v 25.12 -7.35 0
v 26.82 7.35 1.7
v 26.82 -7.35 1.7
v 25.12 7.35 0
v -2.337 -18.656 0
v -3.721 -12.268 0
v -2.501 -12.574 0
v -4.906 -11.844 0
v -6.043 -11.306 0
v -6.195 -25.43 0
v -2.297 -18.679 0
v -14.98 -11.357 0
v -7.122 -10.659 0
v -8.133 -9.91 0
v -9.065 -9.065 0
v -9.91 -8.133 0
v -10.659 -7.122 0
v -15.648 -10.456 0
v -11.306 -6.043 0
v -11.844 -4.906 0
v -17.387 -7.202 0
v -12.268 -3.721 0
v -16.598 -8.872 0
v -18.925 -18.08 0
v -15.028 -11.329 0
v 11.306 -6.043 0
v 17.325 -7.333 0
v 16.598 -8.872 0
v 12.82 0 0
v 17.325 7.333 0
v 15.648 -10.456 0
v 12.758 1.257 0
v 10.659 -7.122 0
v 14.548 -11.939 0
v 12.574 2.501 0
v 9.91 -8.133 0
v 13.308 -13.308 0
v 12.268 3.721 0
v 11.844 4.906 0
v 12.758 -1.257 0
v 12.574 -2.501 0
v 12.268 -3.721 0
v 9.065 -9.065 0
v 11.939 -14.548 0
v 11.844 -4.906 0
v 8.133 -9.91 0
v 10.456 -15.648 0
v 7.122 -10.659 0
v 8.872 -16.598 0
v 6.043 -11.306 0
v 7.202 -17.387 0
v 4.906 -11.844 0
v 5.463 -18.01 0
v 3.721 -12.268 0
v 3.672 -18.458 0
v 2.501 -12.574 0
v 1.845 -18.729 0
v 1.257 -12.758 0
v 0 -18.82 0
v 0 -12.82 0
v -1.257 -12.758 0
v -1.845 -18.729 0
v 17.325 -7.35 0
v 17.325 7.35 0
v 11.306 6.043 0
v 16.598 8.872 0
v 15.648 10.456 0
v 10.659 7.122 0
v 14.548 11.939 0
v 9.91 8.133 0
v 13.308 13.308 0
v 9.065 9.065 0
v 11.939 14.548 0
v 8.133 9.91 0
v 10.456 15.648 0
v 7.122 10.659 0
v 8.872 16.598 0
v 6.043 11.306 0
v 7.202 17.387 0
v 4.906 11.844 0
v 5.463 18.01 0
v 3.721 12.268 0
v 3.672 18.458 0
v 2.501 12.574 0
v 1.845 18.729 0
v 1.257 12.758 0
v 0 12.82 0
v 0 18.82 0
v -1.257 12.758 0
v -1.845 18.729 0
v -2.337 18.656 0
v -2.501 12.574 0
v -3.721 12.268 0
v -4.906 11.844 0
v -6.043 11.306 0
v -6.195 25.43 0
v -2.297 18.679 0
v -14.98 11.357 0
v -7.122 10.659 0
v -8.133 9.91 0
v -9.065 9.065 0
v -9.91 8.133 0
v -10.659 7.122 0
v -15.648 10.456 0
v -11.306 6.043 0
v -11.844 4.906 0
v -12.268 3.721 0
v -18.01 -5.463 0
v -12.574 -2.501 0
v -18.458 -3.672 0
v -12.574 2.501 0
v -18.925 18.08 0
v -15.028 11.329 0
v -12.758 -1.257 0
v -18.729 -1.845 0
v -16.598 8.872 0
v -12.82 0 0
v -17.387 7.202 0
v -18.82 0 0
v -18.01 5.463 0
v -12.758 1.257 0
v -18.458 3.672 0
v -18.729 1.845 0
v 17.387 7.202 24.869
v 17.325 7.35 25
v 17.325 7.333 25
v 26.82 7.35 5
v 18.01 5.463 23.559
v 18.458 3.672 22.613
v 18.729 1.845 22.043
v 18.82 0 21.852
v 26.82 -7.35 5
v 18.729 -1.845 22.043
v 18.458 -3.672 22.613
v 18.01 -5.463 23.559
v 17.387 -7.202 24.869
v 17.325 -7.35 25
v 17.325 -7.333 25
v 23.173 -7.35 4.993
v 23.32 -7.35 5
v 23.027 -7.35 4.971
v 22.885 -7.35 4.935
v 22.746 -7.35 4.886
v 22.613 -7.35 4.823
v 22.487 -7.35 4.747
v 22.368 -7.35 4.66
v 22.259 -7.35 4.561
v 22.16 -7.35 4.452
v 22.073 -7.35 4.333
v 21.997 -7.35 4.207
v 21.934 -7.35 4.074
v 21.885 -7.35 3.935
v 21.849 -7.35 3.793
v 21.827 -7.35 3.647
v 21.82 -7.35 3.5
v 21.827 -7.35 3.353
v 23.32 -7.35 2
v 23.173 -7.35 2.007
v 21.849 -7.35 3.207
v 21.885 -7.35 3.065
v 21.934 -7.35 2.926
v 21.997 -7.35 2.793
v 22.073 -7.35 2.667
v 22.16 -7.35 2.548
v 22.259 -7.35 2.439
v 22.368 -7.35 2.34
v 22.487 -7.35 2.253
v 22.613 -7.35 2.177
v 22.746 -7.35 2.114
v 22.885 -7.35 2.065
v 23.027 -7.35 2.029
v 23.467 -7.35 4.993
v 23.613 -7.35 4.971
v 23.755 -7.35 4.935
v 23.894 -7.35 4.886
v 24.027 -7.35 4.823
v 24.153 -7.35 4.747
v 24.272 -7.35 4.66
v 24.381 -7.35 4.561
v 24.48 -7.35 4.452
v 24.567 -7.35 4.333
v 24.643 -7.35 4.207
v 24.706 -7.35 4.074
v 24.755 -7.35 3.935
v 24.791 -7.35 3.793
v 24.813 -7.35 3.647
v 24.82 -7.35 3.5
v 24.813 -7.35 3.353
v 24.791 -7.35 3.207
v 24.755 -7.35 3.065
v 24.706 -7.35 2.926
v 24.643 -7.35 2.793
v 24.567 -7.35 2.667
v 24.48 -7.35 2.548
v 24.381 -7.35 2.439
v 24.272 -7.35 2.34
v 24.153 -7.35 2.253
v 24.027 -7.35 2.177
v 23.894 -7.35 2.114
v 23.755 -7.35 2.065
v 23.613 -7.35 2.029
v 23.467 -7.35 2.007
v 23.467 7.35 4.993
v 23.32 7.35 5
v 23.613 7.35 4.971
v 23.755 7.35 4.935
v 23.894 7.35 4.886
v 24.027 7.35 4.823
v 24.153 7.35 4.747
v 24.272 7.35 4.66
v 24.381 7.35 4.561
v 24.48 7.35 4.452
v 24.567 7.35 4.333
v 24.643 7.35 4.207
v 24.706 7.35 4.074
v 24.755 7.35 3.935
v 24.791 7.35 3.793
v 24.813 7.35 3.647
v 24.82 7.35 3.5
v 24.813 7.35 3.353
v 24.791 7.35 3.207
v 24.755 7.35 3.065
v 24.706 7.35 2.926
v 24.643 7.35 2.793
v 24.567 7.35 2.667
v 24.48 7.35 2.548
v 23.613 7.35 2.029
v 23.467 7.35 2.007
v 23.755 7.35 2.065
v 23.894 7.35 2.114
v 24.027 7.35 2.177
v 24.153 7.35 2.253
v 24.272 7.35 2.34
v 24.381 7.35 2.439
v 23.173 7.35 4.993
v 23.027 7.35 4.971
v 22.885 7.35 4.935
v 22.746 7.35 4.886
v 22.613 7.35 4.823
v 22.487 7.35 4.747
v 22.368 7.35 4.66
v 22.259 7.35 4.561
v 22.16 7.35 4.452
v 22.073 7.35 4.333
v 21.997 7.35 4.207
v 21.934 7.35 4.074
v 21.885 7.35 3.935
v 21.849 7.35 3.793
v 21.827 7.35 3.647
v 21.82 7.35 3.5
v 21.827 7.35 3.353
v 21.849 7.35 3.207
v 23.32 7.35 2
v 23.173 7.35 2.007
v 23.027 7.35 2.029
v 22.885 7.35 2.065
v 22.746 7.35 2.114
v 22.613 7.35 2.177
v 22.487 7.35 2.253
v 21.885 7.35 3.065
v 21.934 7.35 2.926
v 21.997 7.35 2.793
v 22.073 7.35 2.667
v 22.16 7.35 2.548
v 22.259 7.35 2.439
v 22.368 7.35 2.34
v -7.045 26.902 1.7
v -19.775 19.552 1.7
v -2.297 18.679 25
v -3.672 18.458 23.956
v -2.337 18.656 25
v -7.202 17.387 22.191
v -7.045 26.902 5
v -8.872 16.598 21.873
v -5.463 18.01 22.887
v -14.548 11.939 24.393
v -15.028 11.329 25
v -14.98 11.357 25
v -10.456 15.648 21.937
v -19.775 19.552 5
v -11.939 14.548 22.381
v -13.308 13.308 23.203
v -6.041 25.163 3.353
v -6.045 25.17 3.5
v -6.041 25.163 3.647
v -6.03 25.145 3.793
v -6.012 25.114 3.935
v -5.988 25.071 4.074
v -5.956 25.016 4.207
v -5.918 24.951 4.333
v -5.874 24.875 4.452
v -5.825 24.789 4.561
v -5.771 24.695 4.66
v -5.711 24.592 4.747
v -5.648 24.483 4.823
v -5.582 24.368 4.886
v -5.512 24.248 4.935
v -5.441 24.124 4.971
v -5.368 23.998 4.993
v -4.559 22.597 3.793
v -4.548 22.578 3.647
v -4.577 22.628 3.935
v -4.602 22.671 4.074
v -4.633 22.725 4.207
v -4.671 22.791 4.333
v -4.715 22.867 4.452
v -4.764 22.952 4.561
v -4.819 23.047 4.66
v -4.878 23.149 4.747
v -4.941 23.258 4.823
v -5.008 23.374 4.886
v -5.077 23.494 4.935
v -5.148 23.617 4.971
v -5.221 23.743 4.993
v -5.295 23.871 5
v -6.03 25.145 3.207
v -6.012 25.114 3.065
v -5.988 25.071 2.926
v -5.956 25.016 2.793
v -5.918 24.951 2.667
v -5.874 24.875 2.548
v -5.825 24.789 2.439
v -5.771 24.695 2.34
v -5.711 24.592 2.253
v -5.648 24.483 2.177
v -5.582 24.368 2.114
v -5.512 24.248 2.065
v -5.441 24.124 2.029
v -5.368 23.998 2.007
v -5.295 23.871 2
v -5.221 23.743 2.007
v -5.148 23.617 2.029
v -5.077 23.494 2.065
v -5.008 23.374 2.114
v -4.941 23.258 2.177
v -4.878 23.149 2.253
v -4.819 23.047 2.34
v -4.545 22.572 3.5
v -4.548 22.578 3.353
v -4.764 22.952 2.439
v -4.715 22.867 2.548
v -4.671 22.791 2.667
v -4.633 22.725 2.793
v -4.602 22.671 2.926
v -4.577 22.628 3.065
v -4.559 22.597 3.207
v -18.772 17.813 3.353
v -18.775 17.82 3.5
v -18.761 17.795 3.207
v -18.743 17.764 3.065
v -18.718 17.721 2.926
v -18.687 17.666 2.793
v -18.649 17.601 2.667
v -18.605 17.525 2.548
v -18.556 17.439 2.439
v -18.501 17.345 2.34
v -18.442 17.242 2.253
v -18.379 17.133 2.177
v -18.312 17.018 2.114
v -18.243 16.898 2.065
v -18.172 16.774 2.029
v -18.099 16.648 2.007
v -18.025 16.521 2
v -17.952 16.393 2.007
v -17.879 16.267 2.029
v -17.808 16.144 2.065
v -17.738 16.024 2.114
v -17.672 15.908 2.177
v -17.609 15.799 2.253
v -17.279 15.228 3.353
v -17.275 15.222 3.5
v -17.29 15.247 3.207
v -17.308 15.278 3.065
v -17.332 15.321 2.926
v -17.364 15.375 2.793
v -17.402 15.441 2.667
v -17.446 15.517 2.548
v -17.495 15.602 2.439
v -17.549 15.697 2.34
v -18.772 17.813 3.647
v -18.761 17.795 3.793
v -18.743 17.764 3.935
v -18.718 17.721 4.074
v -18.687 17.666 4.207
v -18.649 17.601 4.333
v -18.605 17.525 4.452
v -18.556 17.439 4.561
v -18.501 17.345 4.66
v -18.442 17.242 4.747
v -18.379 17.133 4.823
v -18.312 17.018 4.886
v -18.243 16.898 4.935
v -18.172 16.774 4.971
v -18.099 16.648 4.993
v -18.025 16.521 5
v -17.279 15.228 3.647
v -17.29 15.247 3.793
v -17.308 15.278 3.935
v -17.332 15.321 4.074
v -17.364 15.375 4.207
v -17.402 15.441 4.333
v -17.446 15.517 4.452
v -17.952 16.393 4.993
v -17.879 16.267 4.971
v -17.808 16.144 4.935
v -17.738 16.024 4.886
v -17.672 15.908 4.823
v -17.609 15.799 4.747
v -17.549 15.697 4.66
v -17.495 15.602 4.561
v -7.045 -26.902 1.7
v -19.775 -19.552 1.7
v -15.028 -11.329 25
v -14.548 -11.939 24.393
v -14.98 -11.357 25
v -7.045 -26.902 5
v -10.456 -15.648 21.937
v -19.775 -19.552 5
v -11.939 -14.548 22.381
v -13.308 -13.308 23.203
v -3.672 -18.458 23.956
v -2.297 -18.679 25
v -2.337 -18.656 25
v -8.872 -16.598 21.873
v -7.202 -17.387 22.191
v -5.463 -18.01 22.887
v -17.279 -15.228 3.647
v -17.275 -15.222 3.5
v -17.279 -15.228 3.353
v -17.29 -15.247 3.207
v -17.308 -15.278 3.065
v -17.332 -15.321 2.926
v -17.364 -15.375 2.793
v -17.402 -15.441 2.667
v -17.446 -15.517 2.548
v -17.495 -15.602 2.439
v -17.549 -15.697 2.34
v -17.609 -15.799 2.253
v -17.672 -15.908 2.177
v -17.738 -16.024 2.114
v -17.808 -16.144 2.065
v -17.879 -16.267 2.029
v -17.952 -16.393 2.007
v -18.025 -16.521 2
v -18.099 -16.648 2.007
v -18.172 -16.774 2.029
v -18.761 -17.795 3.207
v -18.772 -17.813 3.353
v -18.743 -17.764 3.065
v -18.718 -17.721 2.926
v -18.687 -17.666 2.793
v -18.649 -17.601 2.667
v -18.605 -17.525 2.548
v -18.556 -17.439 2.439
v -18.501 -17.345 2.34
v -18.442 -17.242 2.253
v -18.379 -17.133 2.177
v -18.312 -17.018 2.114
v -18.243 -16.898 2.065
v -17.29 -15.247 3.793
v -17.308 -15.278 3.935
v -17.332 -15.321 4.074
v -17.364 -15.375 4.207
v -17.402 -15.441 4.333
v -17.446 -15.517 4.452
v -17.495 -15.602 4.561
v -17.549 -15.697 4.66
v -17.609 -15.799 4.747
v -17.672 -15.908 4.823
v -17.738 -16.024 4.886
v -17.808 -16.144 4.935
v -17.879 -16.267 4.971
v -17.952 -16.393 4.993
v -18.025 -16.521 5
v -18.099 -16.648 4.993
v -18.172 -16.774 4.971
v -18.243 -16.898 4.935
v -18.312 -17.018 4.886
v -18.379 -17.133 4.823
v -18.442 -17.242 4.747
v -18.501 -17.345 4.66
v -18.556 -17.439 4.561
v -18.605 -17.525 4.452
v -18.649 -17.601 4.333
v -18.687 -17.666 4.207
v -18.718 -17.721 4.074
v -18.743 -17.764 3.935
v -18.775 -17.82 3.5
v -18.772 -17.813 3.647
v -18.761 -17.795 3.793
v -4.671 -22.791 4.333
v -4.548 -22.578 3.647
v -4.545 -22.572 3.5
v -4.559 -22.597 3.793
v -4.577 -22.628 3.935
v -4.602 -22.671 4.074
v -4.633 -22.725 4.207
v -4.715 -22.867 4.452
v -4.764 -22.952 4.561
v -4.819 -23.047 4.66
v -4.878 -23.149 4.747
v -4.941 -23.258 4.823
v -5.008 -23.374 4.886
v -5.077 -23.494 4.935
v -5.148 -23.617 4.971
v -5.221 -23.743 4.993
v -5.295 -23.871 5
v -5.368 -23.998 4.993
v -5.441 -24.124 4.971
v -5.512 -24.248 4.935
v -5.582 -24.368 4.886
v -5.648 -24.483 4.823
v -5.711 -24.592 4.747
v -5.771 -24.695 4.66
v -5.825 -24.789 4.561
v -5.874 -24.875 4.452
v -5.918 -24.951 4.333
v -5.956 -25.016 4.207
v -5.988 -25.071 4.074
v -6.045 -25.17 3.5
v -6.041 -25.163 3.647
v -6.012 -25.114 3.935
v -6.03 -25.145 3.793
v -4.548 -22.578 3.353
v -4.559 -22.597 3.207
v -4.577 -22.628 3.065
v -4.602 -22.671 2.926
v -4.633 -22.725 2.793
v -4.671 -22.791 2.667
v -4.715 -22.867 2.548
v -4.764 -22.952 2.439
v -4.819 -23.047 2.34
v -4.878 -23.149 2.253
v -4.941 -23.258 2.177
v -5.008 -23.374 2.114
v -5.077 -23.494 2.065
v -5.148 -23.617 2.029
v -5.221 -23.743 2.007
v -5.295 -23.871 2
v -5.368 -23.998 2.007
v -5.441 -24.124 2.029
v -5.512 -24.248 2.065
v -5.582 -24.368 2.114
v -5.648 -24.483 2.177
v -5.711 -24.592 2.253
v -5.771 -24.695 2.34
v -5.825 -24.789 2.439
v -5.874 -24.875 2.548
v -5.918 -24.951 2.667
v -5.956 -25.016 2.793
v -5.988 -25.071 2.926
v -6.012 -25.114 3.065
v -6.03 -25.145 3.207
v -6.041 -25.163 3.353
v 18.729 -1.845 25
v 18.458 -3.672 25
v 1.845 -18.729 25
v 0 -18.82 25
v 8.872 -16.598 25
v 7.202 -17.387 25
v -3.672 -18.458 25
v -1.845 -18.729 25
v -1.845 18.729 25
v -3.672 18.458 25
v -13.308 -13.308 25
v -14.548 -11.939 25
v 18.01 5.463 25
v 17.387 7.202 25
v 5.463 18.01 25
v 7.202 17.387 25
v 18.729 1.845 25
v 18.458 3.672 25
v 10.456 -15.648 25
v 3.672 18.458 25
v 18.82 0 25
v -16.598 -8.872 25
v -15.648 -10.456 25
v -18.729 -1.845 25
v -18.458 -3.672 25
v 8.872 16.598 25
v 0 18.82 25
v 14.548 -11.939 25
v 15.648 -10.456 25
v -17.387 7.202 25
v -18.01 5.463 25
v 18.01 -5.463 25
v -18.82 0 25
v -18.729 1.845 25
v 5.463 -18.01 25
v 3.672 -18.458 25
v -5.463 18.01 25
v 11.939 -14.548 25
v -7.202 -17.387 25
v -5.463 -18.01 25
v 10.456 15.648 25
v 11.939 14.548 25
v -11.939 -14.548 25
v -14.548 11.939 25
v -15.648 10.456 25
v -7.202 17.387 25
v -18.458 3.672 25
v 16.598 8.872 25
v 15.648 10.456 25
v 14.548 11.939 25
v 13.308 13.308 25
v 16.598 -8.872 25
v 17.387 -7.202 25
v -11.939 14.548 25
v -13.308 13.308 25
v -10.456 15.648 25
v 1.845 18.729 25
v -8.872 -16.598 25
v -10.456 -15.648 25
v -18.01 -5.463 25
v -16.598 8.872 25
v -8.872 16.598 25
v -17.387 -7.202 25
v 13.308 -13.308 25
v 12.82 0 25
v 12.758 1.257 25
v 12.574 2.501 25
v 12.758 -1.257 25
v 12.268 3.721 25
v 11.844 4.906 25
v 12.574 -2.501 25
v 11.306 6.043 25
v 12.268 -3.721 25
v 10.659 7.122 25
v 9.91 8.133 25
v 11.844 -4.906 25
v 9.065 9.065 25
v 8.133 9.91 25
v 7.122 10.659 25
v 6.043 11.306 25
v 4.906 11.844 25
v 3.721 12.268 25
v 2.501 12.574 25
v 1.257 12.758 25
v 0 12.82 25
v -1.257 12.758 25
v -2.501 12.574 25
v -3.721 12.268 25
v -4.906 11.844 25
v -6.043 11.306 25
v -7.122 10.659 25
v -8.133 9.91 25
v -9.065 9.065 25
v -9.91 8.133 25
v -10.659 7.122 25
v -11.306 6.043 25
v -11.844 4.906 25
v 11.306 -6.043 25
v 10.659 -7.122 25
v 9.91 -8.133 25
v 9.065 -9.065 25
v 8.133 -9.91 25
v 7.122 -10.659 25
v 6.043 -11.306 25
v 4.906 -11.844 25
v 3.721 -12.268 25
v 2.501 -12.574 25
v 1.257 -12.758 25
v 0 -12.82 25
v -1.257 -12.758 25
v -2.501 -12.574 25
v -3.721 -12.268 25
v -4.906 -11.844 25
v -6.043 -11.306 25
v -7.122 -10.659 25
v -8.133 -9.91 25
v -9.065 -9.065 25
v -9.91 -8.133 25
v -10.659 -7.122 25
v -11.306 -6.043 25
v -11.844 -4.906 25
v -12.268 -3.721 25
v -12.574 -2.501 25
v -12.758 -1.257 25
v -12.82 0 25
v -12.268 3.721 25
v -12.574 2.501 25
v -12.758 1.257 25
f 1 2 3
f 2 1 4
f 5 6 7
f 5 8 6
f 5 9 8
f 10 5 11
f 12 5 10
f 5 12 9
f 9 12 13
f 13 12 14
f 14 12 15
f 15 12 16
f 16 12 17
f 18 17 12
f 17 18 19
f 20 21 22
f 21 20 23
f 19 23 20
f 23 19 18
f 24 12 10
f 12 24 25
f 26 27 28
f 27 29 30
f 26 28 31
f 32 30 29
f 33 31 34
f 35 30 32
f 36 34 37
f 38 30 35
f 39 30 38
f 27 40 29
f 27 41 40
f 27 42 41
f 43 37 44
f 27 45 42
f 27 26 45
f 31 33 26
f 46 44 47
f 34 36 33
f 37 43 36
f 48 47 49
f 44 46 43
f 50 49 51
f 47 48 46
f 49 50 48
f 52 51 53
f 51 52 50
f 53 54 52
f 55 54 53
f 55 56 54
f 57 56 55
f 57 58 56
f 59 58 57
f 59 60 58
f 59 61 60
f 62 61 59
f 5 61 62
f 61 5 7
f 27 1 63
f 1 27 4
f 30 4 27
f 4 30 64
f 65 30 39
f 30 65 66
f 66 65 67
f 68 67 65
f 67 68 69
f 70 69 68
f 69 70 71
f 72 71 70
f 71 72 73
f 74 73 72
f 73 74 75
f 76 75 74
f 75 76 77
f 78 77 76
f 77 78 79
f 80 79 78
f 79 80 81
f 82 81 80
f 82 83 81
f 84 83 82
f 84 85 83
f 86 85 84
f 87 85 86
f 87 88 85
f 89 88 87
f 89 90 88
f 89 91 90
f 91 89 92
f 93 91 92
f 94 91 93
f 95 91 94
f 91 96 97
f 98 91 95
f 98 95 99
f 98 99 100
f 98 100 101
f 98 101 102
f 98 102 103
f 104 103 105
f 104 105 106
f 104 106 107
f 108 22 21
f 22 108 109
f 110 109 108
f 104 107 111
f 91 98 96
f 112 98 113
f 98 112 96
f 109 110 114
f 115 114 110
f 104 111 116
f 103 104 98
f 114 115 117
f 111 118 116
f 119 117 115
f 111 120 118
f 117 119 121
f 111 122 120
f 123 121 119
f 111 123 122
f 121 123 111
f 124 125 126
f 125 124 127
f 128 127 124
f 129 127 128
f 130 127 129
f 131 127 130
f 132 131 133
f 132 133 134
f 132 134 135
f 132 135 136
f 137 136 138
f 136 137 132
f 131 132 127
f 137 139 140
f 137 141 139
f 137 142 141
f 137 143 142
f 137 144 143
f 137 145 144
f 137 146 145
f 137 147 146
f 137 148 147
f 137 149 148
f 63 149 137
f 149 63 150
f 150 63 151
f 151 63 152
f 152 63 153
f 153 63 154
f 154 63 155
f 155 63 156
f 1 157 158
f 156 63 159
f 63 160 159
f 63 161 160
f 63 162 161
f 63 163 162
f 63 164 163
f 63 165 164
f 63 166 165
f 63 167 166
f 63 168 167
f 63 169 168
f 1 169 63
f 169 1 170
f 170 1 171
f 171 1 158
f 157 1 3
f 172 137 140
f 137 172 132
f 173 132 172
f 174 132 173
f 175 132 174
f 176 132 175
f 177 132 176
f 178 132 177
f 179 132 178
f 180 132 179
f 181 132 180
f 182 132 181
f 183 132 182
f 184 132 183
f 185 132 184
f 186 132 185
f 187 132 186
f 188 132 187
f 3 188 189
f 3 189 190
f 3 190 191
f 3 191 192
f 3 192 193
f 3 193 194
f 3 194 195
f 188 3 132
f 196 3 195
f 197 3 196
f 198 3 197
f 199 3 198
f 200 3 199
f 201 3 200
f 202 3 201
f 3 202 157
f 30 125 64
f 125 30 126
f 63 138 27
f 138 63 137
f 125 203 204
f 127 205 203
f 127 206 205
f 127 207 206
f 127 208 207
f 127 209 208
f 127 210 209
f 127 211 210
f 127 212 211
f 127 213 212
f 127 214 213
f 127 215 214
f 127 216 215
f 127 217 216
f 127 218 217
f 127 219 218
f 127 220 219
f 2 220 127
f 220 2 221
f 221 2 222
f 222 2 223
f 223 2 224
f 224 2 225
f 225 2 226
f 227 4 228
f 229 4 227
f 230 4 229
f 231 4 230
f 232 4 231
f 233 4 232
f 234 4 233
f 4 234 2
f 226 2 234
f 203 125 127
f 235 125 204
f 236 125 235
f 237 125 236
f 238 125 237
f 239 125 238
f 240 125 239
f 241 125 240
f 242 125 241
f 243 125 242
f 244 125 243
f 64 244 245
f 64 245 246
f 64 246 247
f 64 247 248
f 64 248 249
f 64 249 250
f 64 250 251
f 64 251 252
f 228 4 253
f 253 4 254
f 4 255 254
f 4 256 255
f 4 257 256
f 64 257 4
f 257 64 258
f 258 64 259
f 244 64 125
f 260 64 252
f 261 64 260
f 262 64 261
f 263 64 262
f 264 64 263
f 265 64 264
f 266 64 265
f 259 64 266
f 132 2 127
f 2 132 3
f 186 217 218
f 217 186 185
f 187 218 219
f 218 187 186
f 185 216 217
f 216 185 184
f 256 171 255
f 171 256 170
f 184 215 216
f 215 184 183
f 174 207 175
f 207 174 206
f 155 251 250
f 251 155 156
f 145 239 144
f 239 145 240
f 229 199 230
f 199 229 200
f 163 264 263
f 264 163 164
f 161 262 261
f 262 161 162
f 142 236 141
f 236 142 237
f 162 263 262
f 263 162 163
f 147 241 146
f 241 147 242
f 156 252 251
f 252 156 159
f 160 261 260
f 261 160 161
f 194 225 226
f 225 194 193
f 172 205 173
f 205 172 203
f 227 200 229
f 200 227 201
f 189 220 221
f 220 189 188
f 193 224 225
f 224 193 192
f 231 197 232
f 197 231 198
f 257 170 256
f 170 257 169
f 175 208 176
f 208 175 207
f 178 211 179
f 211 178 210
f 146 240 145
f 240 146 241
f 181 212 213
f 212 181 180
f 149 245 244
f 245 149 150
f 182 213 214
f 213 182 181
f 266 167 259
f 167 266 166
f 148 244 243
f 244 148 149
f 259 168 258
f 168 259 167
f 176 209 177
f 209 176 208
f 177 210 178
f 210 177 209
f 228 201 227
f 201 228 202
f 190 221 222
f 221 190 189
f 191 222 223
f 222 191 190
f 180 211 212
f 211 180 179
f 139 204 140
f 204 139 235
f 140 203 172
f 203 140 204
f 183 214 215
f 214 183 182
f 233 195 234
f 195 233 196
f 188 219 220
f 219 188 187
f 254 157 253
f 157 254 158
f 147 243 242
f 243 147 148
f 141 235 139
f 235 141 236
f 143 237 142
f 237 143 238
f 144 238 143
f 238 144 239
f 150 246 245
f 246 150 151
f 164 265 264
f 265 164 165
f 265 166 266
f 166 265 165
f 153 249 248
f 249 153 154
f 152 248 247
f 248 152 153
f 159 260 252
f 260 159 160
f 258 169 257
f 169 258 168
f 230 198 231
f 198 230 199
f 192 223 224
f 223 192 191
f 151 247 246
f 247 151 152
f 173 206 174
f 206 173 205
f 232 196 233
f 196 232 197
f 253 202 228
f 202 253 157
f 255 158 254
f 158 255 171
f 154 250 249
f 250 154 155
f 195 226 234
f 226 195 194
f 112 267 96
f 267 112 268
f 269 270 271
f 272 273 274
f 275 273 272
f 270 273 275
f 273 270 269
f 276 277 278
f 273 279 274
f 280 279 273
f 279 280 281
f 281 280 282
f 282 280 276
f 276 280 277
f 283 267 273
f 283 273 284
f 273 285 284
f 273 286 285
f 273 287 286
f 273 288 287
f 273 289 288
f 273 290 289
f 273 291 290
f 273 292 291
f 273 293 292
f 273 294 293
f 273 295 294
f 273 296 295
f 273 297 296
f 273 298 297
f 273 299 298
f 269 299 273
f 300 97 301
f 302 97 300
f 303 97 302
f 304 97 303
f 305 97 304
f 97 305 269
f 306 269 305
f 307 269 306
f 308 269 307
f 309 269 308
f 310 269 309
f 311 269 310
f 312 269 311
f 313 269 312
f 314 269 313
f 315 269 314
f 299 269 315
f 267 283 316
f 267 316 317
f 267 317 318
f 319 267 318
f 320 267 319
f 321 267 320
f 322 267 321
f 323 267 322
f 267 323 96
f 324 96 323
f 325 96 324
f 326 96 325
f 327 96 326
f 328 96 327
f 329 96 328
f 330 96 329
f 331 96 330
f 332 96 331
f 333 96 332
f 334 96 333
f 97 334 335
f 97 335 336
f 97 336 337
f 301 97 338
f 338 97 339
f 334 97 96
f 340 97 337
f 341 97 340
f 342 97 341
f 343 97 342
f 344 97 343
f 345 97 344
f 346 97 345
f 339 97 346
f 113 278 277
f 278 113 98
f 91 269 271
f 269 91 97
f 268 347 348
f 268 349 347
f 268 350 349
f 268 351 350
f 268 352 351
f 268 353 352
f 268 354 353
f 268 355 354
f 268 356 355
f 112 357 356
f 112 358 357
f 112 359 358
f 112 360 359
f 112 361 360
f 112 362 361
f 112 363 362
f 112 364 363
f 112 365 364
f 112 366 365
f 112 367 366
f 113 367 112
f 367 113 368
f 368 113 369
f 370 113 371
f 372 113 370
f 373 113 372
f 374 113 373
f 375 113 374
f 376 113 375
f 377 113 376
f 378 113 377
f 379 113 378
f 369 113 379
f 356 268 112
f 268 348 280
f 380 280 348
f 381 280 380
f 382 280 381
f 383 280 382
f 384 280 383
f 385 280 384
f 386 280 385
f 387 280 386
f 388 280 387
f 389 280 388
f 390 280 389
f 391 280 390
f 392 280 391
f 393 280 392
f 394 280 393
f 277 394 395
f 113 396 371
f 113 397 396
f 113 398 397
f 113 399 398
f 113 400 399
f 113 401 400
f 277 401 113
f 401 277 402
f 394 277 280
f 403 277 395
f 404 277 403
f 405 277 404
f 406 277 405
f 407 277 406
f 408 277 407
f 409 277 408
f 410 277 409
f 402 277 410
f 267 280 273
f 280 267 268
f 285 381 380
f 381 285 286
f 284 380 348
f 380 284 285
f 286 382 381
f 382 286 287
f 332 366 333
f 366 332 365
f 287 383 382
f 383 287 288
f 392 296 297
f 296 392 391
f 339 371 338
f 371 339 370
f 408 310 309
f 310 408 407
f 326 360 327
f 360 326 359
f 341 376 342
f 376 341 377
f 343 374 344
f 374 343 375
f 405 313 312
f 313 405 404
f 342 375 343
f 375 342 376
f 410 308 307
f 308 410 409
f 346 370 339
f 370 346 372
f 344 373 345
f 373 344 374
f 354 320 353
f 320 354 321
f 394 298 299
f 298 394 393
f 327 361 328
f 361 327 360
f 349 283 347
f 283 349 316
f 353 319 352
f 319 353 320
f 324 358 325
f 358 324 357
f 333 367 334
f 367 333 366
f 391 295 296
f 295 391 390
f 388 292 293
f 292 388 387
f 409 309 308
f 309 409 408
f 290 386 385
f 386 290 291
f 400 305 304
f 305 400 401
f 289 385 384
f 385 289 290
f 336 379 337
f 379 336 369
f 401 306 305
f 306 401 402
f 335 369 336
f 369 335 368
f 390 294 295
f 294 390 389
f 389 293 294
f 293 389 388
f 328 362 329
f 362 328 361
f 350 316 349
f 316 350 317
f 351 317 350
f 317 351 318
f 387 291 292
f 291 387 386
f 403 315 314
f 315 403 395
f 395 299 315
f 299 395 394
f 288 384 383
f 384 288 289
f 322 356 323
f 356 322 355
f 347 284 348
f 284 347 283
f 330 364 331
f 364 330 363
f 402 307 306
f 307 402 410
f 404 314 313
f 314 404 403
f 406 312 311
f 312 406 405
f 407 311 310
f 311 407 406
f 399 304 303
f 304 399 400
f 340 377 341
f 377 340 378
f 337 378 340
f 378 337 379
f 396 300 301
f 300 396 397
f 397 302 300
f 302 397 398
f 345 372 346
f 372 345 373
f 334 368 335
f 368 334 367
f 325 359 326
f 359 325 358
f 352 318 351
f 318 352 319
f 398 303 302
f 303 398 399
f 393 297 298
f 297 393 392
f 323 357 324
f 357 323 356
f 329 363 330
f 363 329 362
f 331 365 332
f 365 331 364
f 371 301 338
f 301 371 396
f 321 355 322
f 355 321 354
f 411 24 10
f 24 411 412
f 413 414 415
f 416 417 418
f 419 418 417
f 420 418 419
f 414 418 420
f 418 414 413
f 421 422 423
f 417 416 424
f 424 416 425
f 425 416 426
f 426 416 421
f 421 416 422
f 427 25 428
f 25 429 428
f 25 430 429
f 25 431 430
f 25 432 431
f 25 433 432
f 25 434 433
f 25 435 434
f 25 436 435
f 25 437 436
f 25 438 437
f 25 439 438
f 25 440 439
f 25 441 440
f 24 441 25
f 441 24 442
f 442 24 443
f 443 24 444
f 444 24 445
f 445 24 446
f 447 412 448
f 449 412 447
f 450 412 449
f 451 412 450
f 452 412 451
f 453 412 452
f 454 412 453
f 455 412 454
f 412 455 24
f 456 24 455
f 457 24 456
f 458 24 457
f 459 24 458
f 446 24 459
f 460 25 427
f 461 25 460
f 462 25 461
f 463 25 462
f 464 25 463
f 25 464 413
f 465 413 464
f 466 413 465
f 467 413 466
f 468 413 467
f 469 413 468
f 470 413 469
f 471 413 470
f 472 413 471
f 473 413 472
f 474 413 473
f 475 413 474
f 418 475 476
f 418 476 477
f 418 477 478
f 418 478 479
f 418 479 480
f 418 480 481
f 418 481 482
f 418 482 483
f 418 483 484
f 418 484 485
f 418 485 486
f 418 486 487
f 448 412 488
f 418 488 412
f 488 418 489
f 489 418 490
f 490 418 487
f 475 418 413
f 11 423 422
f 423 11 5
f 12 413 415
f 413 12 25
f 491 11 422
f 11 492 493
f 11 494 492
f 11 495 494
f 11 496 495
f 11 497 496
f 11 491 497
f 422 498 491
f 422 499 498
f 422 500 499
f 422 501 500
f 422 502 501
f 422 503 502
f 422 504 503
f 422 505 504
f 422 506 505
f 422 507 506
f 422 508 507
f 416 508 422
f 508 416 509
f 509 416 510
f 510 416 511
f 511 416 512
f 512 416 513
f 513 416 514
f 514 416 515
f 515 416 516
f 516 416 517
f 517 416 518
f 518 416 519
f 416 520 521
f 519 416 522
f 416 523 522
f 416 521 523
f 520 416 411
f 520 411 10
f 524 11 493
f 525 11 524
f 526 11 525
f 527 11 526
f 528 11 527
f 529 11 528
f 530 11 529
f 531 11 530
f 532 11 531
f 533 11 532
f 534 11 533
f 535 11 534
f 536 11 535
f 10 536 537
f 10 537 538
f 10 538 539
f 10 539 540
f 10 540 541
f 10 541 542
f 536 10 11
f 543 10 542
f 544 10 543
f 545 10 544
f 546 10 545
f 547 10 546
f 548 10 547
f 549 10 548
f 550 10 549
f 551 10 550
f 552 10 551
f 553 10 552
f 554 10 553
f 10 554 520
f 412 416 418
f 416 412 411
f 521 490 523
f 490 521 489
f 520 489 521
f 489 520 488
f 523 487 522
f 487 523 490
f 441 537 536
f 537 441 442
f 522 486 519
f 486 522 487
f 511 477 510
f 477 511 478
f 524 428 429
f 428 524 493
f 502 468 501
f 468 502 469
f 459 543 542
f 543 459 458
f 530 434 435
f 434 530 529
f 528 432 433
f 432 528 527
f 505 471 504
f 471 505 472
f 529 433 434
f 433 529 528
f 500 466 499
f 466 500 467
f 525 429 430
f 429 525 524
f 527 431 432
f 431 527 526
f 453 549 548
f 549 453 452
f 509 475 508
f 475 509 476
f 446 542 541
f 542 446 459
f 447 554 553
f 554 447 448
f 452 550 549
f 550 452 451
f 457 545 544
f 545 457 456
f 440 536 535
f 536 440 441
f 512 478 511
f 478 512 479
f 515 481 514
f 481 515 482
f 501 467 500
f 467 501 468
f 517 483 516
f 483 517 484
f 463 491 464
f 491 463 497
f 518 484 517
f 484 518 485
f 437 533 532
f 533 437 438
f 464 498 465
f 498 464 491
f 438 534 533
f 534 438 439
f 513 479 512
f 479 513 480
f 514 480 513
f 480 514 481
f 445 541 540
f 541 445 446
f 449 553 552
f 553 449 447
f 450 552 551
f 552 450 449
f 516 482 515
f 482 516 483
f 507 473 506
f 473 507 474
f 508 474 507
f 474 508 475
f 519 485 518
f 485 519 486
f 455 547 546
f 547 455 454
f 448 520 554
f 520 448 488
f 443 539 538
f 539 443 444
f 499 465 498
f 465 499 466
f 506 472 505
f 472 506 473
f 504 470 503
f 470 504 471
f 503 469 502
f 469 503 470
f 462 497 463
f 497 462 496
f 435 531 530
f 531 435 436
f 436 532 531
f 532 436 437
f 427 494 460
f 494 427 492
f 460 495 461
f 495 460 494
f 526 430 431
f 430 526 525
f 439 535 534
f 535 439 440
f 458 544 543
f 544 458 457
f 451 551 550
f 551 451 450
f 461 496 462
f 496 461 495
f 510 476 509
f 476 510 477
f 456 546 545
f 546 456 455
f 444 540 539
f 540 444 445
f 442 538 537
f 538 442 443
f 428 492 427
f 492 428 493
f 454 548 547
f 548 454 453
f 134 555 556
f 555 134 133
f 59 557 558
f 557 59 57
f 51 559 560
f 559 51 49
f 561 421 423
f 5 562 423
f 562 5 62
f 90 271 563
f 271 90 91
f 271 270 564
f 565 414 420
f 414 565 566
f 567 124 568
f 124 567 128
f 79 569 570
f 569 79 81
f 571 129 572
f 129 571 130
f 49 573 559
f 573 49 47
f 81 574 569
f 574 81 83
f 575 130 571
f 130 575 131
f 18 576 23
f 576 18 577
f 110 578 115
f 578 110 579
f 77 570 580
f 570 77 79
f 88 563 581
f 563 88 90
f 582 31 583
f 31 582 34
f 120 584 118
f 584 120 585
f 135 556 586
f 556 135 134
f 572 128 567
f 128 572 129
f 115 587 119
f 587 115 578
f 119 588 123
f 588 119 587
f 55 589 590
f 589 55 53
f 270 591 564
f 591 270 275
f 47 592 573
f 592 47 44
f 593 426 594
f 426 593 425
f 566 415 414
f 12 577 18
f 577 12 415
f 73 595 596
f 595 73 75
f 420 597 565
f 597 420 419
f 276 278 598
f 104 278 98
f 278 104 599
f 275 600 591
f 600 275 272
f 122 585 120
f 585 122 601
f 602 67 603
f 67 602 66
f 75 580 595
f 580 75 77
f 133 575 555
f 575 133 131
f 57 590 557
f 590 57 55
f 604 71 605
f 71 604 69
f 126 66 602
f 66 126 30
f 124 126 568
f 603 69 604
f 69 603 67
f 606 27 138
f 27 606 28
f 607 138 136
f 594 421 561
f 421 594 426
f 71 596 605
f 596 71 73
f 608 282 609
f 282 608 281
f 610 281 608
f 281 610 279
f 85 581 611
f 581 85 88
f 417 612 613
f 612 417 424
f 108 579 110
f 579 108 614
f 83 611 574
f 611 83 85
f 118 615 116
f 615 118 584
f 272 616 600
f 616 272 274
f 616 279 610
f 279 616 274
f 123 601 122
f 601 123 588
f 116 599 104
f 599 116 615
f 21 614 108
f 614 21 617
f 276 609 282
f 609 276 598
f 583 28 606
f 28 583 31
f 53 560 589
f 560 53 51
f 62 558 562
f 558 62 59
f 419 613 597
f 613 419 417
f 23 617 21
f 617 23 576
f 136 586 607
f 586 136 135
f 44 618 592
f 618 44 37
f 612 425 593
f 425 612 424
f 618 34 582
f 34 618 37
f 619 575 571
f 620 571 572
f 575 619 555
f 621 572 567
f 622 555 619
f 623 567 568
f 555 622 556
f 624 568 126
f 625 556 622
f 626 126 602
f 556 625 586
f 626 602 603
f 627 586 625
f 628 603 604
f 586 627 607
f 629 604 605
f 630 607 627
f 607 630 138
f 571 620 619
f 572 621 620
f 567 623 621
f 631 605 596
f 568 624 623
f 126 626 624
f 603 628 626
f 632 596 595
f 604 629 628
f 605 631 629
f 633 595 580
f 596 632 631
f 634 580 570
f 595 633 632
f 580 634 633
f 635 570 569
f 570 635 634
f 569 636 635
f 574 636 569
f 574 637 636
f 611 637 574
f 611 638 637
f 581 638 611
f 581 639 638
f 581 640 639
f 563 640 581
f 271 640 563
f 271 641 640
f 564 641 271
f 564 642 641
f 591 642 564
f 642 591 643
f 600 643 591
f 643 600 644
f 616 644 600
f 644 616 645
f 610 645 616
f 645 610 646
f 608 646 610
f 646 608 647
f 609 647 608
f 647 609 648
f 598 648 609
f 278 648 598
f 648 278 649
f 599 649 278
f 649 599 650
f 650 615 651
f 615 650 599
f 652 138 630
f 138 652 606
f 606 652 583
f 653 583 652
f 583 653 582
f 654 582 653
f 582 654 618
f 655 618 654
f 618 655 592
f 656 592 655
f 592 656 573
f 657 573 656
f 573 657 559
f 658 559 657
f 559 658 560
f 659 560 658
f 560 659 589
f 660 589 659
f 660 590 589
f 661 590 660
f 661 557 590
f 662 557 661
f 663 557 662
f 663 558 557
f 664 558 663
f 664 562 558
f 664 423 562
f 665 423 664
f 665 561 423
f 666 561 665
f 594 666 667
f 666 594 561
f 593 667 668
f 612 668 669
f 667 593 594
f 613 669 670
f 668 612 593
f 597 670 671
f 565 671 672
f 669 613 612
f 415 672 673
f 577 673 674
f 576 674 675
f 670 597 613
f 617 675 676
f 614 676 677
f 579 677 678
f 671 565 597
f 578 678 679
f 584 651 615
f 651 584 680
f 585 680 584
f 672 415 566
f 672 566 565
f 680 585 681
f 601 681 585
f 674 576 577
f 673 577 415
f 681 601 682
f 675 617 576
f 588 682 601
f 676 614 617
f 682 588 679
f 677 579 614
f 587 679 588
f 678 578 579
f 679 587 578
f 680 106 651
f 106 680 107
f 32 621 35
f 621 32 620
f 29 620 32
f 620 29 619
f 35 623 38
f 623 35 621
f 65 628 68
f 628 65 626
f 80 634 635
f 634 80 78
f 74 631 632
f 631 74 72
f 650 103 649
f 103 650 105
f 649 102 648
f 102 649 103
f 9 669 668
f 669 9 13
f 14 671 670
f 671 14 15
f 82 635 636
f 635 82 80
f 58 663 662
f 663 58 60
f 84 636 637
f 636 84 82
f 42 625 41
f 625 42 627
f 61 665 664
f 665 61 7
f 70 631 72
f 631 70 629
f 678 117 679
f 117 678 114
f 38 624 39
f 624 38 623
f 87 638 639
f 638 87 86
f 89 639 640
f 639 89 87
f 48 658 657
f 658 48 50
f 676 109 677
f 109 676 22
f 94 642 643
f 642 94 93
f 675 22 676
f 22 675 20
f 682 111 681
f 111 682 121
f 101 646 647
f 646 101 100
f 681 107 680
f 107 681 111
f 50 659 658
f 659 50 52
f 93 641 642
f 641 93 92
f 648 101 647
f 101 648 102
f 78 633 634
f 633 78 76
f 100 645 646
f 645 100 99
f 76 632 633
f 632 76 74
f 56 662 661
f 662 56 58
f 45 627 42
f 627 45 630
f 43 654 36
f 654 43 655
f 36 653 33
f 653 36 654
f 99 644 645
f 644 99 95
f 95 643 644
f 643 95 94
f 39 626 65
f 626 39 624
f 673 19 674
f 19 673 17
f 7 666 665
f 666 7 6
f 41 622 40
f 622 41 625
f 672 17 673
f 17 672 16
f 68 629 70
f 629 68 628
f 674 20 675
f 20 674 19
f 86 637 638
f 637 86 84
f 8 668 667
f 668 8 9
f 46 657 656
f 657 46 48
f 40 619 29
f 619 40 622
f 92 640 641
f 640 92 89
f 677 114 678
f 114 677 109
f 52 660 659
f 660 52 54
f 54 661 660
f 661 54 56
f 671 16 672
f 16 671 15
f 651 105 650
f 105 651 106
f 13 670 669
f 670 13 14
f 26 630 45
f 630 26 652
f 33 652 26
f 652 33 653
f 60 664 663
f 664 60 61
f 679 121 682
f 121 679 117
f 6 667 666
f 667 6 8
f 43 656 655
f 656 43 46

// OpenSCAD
use <tubemesh.scad>;

//<params>
tubeDiameter = 24.84;
tubeTolerance = 0.4;

sleeveHeight = 25;
sleeveThickness = 6;
attachmentWidth = 14.7;
attachmentTolerance = 0;
attachmentBottomThickness = 8;
attachmentHoleDiameter = 3;
attachmentHoleHeight = 3.5;
attachmentHoleInset = 3.5;
bottomBezel = 1.7;
//</params>

module dummy() {}

$fn = 64;

// R = H/2+W^2/8H
function cordToRadius(H,W) = H/2+W*W/(8*H);
function cordHeight(R,W) = R-(0.5)*sqrt(4*R*R-W*W);

outerRadius = tubeDiameter/2+tubeTolerance+sleeveThickness;
attachmentWidth1 = attachmentWidth-2*attachmentTolerance;
attachmentInset = cordHeight(outerRadius,attachmentWidth1);

echo(attachmentInset);

module attachment() {
  function S(thickness,z) =
    sectionZ([[-attachmentInset,-attachmentWidth1/2],[-attachmentInset+thickness,-attachmentWidth1/2],[-attachmentInset+thickness,attachmentWidth1/2],[-attachmentInset,attachmentWidth1/2]],z);
    
    translate([outerRadius,0,0])
  difference() {
  tubeMesh(
    [S(attachmentBottomThickness+attachmentInset-bottomBezel,0),
    S(attachmentBottomThickness+attachmentInset,bottomBezel),
    S(attachmentBottomThickness+attachmentInset,attachmentHoleHeight+attachmentHoleDiameter/2),
      S(0,sleeveHeight)]); 
      
      translate([attachmentBottomThickness-attachmentHoleInset,0,attachmentHoleHeight])
      rotate([90,0,0])
      cylinder(d=attachmentHoleDiameter,h=3*attachmentWidth1,center=true);
  }
}

difference() {
    union() {
        cylinder(r=outerRadius,h=sleeveHeight);
        for (a=[0,120,240]) rotate([0,0,a]) attachment();
    }
    translate([0,0,-1]) cylinder(d=tubeDiameter+2*tubeTolerance,h=sleeveHeight+2);
}
